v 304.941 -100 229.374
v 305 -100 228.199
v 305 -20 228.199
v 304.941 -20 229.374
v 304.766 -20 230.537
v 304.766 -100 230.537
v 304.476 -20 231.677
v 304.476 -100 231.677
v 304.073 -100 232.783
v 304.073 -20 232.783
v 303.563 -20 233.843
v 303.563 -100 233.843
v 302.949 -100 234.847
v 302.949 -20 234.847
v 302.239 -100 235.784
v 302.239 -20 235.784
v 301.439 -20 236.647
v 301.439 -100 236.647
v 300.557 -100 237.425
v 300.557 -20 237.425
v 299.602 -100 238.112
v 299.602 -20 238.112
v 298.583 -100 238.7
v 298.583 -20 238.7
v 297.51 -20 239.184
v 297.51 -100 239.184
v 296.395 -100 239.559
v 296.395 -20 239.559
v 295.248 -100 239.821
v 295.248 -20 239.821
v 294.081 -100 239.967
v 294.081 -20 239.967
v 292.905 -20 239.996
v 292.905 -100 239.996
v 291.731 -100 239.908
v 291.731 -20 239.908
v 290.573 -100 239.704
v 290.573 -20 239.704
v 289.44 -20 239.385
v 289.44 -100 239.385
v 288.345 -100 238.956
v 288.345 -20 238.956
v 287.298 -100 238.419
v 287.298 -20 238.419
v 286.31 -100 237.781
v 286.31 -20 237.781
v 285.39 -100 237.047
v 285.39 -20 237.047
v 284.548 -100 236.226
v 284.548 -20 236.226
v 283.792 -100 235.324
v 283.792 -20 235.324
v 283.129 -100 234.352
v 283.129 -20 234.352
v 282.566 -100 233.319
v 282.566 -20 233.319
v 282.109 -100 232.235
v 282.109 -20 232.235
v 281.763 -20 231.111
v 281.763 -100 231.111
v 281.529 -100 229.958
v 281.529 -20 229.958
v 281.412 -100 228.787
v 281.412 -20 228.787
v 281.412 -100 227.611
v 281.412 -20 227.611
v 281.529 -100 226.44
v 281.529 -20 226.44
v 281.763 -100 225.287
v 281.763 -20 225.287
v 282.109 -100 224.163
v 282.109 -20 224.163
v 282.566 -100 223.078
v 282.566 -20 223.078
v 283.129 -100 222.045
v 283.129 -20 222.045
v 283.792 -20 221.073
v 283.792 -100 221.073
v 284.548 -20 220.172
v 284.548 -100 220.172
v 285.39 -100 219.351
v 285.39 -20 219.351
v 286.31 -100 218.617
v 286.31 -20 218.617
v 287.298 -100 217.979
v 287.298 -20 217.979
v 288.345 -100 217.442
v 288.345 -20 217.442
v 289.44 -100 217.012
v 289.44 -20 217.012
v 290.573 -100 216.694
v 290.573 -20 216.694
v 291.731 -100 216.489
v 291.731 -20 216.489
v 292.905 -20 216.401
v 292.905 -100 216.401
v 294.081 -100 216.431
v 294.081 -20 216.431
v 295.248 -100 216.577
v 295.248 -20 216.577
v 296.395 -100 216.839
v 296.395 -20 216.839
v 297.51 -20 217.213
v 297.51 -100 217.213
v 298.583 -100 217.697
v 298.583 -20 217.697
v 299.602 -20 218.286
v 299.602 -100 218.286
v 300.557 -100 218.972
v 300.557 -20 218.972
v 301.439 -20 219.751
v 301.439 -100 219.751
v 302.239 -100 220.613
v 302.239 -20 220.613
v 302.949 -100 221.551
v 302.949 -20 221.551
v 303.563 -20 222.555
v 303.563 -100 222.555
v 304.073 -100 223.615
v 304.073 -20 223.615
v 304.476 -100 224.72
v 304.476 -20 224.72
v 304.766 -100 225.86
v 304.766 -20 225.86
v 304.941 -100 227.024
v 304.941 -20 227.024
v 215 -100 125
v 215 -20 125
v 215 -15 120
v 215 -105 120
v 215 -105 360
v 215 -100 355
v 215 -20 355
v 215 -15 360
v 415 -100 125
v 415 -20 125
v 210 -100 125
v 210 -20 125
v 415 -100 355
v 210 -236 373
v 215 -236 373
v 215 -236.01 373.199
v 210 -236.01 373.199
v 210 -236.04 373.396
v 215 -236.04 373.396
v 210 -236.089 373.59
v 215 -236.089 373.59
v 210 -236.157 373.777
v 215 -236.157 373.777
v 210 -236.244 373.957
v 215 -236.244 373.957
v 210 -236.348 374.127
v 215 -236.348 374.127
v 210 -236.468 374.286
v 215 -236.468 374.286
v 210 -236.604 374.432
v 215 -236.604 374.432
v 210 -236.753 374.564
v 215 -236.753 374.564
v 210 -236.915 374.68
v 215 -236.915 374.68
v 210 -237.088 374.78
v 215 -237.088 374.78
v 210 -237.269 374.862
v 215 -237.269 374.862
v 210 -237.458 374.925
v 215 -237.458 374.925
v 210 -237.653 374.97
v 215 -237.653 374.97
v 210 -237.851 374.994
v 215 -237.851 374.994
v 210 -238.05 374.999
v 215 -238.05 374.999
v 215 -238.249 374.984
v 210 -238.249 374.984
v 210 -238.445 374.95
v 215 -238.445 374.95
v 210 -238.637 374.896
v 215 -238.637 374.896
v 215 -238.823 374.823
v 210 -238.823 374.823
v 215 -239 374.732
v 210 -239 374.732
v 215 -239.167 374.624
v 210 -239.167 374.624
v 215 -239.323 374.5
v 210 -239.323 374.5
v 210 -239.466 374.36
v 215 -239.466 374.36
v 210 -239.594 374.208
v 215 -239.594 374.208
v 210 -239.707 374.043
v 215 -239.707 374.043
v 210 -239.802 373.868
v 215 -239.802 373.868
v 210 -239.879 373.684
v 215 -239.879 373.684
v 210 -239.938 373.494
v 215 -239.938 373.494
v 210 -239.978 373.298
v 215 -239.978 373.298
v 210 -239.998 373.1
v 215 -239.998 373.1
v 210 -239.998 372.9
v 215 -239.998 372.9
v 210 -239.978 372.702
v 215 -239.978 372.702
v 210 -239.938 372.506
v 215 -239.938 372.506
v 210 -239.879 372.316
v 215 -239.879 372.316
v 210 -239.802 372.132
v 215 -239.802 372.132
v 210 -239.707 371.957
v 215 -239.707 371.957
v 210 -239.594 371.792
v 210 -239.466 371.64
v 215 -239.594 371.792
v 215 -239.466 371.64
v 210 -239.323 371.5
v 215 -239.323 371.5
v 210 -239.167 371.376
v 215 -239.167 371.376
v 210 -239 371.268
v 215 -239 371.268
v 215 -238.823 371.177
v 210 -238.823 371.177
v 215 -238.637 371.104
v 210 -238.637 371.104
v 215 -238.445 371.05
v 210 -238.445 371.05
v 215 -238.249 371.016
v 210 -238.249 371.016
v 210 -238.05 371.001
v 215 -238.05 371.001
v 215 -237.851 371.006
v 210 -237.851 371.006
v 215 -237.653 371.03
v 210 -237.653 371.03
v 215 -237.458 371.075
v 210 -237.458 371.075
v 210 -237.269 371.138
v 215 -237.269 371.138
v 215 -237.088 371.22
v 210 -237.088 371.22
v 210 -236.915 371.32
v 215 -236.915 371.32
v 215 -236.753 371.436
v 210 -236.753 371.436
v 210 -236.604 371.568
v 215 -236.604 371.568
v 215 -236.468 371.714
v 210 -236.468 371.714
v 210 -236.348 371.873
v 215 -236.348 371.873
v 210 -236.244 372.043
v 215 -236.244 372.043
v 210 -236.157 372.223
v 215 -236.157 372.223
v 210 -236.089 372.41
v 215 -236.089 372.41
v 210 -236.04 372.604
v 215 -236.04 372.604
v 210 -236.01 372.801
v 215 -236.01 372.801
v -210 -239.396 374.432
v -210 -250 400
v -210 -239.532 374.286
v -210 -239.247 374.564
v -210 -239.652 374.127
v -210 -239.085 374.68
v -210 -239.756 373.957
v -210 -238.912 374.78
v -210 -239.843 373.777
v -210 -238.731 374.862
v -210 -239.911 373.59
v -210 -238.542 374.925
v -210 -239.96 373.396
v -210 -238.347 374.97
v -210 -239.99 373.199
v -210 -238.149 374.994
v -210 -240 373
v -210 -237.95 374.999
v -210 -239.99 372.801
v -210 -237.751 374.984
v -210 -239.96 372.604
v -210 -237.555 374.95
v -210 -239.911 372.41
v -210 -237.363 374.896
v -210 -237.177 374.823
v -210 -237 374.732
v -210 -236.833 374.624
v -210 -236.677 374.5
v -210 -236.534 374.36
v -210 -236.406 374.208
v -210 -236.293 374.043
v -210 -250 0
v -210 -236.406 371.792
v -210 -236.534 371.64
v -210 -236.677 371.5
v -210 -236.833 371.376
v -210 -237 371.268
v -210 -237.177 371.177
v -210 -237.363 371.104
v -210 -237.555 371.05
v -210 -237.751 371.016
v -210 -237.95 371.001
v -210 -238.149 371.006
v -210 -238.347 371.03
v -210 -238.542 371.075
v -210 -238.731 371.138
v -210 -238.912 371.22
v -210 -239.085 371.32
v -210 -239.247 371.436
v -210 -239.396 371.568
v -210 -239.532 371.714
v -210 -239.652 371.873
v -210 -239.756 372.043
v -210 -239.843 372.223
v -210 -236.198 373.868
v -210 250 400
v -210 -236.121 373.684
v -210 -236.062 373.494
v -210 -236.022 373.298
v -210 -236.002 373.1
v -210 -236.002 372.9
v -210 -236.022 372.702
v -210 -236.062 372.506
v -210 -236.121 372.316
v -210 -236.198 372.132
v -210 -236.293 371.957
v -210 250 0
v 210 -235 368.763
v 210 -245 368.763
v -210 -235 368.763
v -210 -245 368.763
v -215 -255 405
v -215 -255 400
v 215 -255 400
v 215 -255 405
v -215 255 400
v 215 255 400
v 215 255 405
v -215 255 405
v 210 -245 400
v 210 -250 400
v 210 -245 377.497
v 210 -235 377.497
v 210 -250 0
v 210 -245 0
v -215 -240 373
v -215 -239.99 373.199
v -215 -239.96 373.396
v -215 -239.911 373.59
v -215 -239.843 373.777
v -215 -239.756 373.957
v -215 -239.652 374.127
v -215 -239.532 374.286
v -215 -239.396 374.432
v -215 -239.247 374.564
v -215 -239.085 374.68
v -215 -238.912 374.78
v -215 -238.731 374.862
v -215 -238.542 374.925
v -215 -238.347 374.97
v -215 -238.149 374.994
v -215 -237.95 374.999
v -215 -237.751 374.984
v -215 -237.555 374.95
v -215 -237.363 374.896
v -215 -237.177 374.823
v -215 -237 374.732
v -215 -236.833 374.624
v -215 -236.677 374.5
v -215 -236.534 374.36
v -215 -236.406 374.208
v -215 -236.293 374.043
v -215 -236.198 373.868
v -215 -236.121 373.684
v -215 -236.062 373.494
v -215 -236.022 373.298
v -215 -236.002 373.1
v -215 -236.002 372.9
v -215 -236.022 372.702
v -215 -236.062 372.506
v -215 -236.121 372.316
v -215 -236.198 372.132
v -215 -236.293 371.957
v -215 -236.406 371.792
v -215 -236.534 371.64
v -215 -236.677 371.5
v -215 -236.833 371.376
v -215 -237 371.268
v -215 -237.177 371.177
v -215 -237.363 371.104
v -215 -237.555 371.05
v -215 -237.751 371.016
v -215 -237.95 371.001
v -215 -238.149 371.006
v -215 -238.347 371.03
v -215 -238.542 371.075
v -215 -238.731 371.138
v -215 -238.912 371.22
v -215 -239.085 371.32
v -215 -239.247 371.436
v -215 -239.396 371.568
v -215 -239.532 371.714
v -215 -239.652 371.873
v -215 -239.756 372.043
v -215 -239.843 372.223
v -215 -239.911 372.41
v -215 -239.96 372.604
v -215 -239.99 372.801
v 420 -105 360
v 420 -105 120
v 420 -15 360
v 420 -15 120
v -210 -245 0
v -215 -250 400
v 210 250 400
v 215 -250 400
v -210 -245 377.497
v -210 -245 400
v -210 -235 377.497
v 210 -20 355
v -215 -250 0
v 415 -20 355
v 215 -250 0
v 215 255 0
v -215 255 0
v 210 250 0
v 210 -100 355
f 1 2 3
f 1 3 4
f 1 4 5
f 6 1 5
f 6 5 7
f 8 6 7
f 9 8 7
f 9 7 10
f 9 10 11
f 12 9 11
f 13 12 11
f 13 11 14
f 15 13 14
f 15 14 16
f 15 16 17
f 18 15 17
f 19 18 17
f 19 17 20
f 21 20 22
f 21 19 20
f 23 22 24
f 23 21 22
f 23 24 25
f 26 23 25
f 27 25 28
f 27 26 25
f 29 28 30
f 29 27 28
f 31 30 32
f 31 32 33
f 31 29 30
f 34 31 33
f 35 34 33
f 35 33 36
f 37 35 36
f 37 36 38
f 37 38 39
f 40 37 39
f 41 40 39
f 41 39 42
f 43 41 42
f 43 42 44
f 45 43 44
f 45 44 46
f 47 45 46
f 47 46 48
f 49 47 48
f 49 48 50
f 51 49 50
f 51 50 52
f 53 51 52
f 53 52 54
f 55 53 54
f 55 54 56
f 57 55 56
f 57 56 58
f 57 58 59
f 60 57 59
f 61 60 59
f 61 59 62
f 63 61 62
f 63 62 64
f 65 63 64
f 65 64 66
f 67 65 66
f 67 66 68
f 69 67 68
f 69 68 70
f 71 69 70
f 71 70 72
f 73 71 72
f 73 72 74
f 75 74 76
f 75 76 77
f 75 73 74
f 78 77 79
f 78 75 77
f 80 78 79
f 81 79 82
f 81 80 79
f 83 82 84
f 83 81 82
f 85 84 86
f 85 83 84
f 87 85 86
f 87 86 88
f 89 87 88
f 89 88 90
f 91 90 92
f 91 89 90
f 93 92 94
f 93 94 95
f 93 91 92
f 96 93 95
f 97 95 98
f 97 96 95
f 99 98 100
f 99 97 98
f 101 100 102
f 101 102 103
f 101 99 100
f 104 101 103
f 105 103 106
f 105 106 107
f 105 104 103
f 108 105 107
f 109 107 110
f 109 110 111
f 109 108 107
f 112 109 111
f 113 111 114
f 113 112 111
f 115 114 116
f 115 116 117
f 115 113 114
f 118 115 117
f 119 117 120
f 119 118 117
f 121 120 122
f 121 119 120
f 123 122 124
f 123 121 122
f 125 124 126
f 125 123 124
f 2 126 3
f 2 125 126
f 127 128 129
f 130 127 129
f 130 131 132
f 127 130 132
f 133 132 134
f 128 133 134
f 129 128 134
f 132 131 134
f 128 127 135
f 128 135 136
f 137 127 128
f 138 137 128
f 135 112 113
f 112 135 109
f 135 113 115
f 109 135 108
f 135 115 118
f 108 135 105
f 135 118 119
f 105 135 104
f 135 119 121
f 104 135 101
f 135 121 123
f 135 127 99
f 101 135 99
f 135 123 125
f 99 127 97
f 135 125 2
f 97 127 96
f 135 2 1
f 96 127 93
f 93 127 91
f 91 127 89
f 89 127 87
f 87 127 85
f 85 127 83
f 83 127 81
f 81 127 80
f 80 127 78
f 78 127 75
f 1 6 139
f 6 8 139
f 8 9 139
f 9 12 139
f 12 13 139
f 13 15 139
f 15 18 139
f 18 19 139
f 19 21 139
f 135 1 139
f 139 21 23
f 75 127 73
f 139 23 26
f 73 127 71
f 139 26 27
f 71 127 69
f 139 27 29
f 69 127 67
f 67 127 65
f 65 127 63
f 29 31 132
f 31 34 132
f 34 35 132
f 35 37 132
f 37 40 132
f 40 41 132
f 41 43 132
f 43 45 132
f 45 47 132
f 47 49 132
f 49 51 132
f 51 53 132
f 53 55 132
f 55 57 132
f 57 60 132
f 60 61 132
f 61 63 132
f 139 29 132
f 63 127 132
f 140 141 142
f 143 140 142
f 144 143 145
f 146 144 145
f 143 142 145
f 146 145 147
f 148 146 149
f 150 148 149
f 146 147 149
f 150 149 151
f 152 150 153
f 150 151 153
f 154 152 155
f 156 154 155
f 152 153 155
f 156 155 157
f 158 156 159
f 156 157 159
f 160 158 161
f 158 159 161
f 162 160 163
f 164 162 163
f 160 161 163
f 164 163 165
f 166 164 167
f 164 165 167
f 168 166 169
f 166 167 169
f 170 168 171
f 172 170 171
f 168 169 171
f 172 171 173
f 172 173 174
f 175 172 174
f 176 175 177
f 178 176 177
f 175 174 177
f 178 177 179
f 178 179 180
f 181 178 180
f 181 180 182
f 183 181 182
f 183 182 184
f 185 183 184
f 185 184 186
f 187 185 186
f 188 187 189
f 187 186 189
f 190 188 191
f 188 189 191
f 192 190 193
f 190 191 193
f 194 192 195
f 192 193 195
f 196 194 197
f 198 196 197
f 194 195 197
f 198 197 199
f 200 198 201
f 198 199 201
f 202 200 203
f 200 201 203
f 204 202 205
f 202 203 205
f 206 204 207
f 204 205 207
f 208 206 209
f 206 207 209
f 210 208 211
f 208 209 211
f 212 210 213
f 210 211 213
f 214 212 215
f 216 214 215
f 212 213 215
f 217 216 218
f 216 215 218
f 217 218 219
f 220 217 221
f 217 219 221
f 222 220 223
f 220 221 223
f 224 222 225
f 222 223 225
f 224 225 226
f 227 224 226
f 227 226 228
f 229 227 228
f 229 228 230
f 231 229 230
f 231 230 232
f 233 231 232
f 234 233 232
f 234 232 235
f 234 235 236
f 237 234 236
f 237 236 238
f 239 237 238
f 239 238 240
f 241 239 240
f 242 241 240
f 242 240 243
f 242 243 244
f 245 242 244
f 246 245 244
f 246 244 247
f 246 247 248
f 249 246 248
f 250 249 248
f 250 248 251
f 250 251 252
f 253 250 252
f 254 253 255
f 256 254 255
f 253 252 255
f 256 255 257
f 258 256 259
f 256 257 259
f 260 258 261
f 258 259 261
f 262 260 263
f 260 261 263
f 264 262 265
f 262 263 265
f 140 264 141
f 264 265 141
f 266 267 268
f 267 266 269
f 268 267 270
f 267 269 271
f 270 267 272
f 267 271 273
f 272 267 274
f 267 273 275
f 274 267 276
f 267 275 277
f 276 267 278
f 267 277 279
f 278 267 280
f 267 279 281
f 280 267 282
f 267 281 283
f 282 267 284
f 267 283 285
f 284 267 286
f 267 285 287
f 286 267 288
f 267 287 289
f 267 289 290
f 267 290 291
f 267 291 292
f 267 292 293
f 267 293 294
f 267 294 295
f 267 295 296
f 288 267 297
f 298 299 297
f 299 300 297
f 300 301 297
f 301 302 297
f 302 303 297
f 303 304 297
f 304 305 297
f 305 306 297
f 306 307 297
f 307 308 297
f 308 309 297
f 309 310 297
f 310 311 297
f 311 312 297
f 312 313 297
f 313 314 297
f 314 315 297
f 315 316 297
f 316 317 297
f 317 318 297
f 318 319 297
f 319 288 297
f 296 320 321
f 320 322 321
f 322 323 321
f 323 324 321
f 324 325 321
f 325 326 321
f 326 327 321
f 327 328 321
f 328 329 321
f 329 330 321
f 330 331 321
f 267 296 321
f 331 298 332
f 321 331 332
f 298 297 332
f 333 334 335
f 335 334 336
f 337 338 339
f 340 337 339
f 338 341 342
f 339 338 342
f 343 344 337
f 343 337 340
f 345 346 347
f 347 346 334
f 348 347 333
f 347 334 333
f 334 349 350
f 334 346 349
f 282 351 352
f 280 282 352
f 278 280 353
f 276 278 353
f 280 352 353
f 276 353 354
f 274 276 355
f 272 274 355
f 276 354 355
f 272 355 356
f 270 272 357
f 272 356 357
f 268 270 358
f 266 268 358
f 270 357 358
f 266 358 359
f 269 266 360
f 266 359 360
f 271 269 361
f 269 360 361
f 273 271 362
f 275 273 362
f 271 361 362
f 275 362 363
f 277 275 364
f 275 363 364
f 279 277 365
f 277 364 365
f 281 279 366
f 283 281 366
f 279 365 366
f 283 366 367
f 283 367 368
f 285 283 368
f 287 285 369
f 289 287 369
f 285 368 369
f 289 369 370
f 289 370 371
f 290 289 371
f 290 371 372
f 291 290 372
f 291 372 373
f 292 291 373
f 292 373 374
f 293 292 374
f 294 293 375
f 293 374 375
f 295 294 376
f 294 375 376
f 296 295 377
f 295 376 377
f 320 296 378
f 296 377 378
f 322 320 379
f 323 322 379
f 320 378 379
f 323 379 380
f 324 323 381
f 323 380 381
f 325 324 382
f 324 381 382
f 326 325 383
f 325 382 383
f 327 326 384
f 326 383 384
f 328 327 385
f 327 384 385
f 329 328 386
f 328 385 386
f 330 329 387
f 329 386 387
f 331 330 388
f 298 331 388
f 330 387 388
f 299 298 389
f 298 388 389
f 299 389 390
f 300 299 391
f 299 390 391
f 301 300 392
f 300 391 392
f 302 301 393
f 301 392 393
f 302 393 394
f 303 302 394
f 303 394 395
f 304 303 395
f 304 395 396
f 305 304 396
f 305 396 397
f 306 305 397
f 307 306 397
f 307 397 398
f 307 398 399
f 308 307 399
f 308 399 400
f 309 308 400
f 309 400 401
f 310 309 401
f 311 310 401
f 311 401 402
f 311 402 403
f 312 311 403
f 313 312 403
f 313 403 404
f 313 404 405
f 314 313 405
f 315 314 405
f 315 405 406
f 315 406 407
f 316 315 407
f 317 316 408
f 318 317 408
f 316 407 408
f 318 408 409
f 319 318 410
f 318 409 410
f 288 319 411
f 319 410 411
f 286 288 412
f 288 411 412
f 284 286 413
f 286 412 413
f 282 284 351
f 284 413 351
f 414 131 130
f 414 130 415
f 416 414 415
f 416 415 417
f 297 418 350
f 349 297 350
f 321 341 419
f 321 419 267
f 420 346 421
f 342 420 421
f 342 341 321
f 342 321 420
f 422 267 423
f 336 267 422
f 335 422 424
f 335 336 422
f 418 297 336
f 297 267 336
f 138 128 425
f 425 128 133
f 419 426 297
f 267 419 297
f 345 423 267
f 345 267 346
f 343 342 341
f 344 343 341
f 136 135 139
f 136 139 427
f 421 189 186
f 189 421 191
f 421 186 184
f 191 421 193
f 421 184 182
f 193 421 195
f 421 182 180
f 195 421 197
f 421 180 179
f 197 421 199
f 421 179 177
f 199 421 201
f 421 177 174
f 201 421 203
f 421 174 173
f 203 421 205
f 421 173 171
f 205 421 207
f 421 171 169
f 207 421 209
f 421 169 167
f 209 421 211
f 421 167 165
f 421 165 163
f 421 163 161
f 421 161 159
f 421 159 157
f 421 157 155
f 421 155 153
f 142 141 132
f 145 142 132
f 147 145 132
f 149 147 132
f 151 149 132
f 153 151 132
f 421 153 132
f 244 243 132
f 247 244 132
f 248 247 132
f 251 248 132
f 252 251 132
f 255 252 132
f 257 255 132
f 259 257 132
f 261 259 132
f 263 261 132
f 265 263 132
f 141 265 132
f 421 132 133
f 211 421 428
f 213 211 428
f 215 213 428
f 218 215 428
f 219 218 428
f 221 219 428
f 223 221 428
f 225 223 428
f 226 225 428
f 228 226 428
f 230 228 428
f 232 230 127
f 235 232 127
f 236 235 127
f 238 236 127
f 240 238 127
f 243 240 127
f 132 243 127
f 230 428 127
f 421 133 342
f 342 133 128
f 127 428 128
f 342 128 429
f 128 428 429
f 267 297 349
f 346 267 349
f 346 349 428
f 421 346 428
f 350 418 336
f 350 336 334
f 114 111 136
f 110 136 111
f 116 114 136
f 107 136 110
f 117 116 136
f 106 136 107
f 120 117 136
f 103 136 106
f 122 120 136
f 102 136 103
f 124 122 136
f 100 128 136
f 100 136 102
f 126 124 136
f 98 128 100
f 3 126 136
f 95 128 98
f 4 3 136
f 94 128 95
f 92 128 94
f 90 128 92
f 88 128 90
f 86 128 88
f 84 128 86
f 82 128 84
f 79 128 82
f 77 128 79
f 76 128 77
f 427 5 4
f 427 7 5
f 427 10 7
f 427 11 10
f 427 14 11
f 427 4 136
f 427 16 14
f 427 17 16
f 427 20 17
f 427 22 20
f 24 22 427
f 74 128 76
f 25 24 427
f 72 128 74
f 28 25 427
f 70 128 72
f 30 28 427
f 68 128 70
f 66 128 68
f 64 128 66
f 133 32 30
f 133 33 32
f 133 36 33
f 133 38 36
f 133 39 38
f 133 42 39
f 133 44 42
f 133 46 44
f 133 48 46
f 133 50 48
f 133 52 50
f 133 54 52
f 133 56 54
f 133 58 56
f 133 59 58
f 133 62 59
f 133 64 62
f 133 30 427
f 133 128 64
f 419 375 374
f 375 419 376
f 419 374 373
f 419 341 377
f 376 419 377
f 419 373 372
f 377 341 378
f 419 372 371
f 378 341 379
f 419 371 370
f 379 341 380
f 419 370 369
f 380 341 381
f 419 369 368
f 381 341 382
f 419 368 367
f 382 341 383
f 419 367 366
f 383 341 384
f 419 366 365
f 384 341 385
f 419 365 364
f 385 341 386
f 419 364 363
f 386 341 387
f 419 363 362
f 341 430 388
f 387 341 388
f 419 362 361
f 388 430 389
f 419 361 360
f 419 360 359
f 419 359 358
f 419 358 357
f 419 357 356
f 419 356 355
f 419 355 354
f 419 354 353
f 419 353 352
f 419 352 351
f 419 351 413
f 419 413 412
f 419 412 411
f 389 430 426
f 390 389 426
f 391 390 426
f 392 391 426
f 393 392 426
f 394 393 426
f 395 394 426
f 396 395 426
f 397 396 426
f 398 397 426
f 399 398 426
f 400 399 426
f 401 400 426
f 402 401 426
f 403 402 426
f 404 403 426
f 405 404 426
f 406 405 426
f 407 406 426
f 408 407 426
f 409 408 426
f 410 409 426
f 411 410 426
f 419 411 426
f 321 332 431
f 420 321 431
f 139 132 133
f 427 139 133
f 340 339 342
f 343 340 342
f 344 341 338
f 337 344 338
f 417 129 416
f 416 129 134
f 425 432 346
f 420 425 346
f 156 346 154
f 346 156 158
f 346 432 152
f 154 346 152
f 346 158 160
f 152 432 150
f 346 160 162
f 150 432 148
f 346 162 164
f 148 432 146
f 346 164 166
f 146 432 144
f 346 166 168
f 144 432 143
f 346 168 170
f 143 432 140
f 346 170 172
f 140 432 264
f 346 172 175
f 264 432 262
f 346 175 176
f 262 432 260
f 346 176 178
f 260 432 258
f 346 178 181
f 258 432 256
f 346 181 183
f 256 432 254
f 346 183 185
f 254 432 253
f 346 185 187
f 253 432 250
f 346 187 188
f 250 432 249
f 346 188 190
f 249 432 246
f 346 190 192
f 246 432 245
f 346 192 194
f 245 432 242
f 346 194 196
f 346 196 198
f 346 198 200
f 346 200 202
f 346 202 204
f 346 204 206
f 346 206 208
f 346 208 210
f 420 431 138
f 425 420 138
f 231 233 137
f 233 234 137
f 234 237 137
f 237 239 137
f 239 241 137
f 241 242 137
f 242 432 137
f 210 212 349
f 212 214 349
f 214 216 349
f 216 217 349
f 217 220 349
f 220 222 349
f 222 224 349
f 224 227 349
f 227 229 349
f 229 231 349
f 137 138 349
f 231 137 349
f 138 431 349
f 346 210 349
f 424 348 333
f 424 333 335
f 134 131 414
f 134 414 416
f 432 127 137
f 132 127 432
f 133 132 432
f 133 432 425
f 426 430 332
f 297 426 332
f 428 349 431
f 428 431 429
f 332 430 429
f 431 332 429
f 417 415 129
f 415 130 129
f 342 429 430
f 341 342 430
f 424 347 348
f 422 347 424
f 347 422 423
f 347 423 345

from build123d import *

# Parameters (mm, degrees)
F1_DEPTH  = 400
F3_DEPTH  = 5
F4_R      = 2
F5_DEPTH  = 5
F6_R      = 2
F7_DEPTH  = 5
F6_W      = 80
F6_H      = 230
F8_DEPTH  = 5
F6_W_2    = 89.9999934435
F6_H_2    = 239.9999934435
F9_DEPTH  = 200
F10_W     = 89.9999934435
F10_H     = 239.9999934435
F11_DEPTH = 5
F12_R     = 11.8011794923
F13_DEPTH = 84.9999967217
F0_W      = 420
F0_H      = 5
F14_DEPTH = 400
F15_W     = 420
F15_H     = 8.734613657
F16_DEPTH = 10


with BuildPart() as f1:
    # F0 (on Top) → F1 (new body)
    with BuildSketch(Plane.XY):
        Polygon((210, -245), (210, -250), (215, -250), (215, 255), (-215, 255), (-215, -250), (-210, -250), (-210, -245), (-210, 250), (210, 250), align=None)
    extrude(amount=F1_DEPTH)

    # F4 (on face) → F5 (cut, through all)
    with BuildSketch(Plane(origin=(-215, 0, 0), x_dir=(0, -1, 0), z_dir=(-1, 0, 0))):
        with Locations((238, 373)):
            Circle(F4_R)
    extrude(amount=-F5_DEPTH, mode=Mode.SUBTRACT)

    # F6 (on face) → F7 (cut, through all)
    with BuildSketch(Plane.YZ.offset(215)):
        with Locations((-238, 373)):
            Circle(F6_R)
    extrude(amount=-F7_DEPTH, mode=Mode.SUBTRACT)

    # F6 (on face) → F8 (cut, through all)
    with BuildSketch(Plane.YZ.offset(215)):
        with Locations((-60, 239.9999967217)):
            Rectangle(F6_W, F6_H)
    extrude(amount=-F8_DEPTH, mode=Mode.SUBTRACT)


with BuildPart() as f3:
    # F2 (on face) → F3 (new body)
    with BuildSketch(Plane.XY.offset(400)):
        Polygon((215, -255), (215, -250), (210, -250), (210, 250), (-210, 250), (-210, -250), (-215, -250), (-215, -255), align=None)
        Polygon((215, -250), (215, 255), (-215, 255), (-215, -250), (-210, -250), (-210, 250), (210, 250), (210, -250), align=None)
    extrude(amount=F3_DEPTH)


with BuildPart() as f9:
    # F6 (on face) → F9 (new body)
    with BuildSketch(Plane.YZ.offset(215)):
        with Locations((-60, 239.9999967217)):
            Rectangle(F6_W_2, F6_H_2)
        with Locations((-60, 239.9999967217)):
            Rectangle(F6_W, F6_H, mode=Mode.SUBTRACT)
    extrude(amount=F9_DEPTH)

    # F10 (on face) → F11 (join)
    with BuildSketch(Plane.YZ.offset(415)):
        with Locations((-60, 239.9999967217)):
            Rectangle(F10_W, F10_H)
    extrude(amount=F11_DEPTH)

    # F12 (on face) → F13 (join, through all)
    with BuildSketch(Plane.XZ.offset(104.9999967217)):
        with Locations((293.1988205077, 228.1988172294)):
            Circle(F12_R)
    extrude(amount=-F13_DEPTH)


with BuildPart() as f14:
    # F0 (on Top) → F14 (new body, through all)
    with BuildSketch(Plane.XY):
        with Locations((0, -247.5)):
            Rectangle(F0_W, F0_H)
    extrude(amount=F14_DEPTH)

    # F15 (on face) → F16 (join)
    with BuildSketch(Plane(origin=(0, -245, 0), x_dir=(-1, 0, 0), z_dir=(0, 1, 0))):
        with Locations((0, 373.1300085784)):
            Rectangle(F15_W, F15_H)
    extrude(amount=F16_DEPTH)


solid = Compound([f1.part, f3.part, f9.part, f14.part])
